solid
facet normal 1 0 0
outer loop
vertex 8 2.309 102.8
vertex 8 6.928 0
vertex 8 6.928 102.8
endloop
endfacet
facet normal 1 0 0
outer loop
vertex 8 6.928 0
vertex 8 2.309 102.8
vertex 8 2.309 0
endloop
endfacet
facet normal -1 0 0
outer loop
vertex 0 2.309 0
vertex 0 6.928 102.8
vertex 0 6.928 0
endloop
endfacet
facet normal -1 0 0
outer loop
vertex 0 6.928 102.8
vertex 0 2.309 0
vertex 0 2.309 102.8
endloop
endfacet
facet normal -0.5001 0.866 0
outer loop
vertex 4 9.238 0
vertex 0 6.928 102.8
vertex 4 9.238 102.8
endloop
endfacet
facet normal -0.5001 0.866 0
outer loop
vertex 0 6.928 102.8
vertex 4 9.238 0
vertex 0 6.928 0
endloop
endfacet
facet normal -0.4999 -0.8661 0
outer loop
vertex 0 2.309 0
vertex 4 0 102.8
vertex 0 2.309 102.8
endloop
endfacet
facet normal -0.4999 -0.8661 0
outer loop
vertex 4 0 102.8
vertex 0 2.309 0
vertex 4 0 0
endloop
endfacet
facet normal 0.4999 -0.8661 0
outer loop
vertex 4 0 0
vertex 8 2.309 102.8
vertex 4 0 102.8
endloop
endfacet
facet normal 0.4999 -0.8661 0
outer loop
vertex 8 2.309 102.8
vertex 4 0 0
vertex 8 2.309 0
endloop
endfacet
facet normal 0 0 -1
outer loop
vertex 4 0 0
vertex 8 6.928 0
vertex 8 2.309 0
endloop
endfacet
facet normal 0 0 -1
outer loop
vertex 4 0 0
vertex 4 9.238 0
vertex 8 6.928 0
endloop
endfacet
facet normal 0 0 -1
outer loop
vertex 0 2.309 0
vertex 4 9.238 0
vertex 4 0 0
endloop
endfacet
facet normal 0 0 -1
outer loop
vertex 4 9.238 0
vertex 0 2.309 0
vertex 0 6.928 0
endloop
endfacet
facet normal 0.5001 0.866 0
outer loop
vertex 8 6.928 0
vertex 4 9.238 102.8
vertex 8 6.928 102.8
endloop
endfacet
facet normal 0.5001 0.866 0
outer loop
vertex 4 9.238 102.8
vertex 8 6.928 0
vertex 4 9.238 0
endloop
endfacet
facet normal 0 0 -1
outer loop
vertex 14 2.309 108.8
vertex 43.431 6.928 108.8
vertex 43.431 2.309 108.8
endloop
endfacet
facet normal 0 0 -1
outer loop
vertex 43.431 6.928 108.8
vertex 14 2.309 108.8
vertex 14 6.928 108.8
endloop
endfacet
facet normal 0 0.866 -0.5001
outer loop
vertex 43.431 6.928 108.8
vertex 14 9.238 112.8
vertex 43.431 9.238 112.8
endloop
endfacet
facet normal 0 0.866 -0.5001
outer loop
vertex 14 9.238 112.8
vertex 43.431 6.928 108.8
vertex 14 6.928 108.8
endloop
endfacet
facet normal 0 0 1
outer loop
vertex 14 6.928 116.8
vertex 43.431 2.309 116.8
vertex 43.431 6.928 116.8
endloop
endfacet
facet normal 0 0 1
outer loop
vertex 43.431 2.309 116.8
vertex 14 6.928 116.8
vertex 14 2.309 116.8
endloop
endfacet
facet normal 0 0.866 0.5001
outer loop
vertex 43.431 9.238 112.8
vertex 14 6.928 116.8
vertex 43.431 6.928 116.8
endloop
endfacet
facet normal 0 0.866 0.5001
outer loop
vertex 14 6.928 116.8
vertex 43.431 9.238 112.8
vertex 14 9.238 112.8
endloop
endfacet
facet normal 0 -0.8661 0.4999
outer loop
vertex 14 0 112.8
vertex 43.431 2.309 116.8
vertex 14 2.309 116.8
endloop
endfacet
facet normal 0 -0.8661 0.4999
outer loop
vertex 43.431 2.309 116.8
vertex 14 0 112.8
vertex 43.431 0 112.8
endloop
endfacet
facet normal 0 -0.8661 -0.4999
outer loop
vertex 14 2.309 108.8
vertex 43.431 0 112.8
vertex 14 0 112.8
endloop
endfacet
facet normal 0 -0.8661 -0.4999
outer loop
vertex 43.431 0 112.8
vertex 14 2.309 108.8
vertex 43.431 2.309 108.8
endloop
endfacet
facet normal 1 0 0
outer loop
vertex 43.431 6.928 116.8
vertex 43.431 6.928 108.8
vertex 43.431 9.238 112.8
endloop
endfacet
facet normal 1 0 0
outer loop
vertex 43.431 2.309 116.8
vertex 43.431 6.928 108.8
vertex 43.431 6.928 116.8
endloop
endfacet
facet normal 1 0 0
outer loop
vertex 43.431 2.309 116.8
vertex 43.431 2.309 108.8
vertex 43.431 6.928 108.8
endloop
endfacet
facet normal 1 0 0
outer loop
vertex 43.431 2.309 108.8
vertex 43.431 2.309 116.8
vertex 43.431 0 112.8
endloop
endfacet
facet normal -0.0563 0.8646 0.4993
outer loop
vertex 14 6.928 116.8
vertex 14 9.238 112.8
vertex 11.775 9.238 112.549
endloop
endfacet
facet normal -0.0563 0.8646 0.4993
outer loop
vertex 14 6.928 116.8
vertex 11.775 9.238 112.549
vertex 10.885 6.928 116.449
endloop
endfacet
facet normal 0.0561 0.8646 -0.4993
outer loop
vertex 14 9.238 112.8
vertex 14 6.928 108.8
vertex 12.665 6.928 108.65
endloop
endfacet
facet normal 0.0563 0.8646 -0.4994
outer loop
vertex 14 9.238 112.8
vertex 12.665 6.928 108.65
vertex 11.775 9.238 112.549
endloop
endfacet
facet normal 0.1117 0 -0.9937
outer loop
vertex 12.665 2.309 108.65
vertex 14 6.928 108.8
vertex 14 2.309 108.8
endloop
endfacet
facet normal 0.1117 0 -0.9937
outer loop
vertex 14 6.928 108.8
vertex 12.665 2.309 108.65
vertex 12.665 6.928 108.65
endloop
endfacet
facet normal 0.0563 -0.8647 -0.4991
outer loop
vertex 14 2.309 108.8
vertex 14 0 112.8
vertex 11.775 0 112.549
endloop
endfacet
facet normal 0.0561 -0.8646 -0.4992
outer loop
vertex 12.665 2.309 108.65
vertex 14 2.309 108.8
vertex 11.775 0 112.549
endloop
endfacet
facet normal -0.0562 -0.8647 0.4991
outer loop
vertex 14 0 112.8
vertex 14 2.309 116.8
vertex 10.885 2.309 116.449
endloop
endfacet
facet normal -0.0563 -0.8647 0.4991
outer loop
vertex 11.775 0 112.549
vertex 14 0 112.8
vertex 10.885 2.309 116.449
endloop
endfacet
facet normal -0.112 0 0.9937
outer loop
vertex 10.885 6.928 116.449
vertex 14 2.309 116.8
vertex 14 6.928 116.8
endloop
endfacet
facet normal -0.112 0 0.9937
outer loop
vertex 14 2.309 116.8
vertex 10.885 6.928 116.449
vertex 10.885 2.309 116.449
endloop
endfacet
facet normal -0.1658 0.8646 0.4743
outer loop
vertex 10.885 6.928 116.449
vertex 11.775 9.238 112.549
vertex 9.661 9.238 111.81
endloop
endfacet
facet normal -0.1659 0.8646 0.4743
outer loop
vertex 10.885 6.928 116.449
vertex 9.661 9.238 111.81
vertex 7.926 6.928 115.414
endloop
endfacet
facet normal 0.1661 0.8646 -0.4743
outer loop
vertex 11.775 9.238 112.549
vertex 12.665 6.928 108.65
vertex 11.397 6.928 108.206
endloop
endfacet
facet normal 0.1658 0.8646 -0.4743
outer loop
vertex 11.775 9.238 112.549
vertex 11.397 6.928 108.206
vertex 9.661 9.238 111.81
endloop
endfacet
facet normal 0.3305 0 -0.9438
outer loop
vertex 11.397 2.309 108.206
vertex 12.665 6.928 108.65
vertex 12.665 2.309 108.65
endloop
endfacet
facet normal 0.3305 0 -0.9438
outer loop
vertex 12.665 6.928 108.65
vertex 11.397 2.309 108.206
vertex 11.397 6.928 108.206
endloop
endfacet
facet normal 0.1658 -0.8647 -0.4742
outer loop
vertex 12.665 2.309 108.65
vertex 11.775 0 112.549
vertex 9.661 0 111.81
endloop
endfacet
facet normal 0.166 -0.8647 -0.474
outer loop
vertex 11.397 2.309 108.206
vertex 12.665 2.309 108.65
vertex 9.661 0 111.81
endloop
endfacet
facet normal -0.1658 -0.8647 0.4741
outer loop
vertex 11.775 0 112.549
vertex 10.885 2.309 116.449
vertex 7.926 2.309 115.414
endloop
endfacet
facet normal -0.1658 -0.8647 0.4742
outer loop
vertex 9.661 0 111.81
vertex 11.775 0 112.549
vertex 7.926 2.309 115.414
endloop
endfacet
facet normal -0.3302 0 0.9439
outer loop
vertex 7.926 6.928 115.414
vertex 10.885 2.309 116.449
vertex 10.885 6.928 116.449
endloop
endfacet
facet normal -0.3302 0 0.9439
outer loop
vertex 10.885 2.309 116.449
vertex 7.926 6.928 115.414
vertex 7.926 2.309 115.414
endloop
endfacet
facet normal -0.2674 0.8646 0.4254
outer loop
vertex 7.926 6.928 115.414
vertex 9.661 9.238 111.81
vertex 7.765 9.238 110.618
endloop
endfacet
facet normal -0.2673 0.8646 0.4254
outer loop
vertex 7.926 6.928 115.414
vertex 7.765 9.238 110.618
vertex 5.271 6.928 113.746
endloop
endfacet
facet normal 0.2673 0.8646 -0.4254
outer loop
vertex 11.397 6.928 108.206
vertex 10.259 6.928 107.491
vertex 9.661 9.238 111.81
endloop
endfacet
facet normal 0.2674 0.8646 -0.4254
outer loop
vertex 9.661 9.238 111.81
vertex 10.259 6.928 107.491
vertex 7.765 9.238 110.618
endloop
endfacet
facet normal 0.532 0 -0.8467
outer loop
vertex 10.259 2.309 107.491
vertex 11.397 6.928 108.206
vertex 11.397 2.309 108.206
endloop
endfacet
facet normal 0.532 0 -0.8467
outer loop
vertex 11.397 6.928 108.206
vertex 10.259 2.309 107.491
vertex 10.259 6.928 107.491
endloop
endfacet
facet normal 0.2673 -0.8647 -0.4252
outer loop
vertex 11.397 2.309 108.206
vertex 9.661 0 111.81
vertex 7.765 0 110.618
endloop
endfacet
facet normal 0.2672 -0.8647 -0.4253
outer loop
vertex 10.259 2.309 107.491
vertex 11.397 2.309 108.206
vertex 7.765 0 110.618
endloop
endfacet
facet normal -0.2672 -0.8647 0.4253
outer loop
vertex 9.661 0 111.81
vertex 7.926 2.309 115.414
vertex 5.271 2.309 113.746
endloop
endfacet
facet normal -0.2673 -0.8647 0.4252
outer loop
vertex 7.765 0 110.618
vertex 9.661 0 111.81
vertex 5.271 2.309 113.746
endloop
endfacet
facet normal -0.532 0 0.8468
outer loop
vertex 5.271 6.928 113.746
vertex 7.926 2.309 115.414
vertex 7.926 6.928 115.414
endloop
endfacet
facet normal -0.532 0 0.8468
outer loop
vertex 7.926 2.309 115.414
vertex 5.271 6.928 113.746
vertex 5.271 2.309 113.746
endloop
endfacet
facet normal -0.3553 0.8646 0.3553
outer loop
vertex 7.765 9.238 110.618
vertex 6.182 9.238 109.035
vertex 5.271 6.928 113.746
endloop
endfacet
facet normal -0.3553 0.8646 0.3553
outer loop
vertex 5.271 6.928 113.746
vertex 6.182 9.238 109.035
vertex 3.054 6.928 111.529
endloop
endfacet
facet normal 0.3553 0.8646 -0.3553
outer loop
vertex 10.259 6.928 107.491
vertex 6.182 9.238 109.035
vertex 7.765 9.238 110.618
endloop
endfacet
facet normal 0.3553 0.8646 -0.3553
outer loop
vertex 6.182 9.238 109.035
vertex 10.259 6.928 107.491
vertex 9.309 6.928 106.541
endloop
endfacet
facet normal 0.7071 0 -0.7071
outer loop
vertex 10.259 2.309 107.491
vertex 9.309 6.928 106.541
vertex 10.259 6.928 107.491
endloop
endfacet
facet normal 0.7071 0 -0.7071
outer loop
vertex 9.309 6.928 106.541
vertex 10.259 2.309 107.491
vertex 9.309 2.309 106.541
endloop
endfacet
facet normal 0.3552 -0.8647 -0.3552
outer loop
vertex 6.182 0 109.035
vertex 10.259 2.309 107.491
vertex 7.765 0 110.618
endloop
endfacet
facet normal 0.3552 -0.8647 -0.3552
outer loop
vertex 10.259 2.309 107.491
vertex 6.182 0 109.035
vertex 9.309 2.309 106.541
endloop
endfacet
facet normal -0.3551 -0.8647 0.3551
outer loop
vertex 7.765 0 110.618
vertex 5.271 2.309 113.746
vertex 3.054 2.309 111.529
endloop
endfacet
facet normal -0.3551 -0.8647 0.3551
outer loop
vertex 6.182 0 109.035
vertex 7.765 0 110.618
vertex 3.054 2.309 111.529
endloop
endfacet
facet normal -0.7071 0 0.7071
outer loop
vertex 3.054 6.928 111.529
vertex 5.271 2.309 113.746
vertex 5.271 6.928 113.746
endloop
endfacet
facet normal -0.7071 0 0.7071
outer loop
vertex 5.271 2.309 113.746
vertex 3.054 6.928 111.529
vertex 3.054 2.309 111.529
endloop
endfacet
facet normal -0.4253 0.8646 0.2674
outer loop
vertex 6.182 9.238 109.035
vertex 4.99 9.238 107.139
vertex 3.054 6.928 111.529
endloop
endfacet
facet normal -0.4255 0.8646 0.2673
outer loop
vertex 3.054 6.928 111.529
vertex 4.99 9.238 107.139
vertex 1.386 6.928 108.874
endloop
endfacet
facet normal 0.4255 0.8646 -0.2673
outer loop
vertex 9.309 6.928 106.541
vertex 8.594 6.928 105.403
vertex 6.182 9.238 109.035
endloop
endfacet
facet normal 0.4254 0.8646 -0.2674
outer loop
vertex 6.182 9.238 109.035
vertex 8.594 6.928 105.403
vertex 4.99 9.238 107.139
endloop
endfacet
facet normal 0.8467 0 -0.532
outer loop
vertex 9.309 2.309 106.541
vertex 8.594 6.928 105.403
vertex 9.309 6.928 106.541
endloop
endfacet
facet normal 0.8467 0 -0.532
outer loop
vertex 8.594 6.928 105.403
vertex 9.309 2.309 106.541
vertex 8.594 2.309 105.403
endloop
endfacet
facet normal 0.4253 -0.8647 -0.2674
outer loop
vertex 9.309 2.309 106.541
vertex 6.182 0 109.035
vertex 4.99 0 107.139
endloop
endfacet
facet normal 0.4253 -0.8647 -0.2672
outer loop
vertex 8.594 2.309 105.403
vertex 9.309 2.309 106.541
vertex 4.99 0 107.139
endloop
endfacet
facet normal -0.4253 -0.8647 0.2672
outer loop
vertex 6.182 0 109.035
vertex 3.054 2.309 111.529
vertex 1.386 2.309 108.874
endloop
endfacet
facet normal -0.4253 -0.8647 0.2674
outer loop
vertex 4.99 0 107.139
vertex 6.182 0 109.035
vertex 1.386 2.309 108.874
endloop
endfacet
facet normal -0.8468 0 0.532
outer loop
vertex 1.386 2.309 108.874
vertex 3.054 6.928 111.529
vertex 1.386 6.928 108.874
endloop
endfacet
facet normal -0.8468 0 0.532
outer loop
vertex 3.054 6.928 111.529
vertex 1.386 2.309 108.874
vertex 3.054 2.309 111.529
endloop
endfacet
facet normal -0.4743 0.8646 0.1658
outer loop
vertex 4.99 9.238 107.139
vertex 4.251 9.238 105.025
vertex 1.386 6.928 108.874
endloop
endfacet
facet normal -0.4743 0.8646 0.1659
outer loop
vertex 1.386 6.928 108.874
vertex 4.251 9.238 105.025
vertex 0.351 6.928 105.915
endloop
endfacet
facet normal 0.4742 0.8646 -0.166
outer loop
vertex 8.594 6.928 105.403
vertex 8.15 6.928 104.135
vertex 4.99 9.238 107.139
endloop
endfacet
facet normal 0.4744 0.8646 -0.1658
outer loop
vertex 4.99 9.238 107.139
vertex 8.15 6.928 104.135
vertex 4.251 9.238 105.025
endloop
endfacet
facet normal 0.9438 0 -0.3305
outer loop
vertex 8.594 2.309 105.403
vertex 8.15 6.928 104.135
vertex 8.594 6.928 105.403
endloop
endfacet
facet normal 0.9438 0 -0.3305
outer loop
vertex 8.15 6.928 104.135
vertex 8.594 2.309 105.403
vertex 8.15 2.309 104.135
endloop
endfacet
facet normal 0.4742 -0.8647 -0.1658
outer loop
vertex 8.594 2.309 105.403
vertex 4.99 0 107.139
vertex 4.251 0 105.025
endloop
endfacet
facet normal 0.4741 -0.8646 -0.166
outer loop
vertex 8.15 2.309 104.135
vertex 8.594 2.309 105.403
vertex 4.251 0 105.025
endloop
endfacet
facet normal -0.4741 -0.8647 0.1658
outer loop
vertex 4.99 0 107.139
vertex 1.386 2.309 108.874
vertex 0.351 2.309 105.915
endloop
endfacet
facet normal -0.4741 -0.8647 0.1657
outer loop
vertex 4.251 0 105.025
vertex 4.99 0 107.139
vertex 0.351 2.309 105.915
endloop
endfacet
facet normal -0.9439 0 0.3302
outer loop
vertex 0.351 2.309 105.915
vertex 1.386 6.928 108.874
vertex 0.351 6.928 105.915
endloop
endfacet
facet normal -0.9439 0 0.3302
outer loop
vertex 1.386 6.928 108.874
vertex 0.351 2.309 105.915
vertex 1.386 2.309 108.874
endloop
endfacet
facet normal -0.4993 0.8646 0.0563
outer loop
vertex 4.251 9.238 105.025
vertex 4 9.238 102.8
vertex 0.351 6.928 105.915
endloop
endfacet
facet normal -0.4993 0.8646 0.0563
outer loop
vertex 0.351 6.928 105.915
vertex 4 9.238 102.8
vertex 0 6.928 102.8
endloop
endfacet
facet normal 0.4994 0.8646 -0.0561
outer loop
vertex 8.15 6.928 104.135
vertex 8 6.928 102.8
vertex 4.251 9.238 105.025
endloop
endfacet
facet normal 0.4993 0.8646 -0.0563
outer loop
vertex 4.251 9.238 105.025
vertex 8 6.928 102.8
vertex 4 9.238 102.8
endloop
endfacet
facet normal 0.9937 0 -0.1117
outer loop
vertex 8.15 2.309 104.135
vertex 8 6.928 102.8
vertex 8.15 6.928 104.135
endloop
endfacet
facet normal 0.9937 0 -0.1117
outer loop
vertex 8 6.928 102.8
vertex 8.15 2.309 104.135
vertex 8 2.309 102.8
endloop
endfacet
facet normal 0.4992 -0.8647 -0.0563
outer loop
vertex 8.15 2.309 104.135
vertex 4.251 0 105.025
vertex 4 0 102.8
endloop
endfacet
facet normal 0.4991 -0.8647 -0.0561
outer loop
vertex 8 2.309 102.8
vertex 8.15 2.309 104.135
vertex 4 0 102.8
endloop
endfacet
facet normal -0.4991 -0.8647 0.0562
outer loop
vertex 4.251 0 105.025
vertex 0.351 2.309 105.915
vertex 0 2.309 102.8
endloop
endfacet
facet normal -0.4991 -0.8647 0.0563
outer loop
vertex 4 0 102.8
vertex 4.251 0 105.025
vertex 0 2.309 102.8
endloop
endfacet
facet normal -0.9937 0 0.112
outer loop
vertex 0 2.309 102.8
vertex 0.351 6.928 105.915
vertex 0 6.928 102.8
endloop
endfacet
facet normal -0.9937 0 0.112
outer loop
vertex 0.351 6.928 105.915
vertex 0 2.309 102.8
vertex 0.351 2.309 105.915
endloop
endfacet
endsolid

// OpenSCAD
imperial_sizes = [.05, 1/16, 5/64, 3/32, 1/8, 5/32, 3/16, 7/32, 1/4, 5/16, 3/8];
metric_sizes = [2, 2.5, 3, 4, 5, 6, 8];
w=44.05;
h=116.8;


module key(w, h, d, r_bend){
    circumdiameter=d*1/sin(60);
    translate([d/2,circumdiameter/2,0]){
    //translate([0,0,0]){
        rotate([0,0,90])
            cylinder(h-d/2-r_bend,d=circumdiameter, $fn=6);
        translate([r_bend,0,h-d/2])
            rotate([0,90,0])
            rotate([0,0,90])
            cylinder(w-circumdiameter/2-r_bend,d=circumdiameter, $fn=6);
        translate([0,0,h-r_bend-d/2])
            rotate([90,-90,0])
            translate([0,-r_bend,0])
            rotate_extrude(angle=90, convexity=10)
            translate([r_bend,0,0])
            rotate([0,0,30])
            circle(d=circumdiameter, $fn=6);
    }
    %cube([w,circumdiameter,h]);
}

key(w,h,8,10);
